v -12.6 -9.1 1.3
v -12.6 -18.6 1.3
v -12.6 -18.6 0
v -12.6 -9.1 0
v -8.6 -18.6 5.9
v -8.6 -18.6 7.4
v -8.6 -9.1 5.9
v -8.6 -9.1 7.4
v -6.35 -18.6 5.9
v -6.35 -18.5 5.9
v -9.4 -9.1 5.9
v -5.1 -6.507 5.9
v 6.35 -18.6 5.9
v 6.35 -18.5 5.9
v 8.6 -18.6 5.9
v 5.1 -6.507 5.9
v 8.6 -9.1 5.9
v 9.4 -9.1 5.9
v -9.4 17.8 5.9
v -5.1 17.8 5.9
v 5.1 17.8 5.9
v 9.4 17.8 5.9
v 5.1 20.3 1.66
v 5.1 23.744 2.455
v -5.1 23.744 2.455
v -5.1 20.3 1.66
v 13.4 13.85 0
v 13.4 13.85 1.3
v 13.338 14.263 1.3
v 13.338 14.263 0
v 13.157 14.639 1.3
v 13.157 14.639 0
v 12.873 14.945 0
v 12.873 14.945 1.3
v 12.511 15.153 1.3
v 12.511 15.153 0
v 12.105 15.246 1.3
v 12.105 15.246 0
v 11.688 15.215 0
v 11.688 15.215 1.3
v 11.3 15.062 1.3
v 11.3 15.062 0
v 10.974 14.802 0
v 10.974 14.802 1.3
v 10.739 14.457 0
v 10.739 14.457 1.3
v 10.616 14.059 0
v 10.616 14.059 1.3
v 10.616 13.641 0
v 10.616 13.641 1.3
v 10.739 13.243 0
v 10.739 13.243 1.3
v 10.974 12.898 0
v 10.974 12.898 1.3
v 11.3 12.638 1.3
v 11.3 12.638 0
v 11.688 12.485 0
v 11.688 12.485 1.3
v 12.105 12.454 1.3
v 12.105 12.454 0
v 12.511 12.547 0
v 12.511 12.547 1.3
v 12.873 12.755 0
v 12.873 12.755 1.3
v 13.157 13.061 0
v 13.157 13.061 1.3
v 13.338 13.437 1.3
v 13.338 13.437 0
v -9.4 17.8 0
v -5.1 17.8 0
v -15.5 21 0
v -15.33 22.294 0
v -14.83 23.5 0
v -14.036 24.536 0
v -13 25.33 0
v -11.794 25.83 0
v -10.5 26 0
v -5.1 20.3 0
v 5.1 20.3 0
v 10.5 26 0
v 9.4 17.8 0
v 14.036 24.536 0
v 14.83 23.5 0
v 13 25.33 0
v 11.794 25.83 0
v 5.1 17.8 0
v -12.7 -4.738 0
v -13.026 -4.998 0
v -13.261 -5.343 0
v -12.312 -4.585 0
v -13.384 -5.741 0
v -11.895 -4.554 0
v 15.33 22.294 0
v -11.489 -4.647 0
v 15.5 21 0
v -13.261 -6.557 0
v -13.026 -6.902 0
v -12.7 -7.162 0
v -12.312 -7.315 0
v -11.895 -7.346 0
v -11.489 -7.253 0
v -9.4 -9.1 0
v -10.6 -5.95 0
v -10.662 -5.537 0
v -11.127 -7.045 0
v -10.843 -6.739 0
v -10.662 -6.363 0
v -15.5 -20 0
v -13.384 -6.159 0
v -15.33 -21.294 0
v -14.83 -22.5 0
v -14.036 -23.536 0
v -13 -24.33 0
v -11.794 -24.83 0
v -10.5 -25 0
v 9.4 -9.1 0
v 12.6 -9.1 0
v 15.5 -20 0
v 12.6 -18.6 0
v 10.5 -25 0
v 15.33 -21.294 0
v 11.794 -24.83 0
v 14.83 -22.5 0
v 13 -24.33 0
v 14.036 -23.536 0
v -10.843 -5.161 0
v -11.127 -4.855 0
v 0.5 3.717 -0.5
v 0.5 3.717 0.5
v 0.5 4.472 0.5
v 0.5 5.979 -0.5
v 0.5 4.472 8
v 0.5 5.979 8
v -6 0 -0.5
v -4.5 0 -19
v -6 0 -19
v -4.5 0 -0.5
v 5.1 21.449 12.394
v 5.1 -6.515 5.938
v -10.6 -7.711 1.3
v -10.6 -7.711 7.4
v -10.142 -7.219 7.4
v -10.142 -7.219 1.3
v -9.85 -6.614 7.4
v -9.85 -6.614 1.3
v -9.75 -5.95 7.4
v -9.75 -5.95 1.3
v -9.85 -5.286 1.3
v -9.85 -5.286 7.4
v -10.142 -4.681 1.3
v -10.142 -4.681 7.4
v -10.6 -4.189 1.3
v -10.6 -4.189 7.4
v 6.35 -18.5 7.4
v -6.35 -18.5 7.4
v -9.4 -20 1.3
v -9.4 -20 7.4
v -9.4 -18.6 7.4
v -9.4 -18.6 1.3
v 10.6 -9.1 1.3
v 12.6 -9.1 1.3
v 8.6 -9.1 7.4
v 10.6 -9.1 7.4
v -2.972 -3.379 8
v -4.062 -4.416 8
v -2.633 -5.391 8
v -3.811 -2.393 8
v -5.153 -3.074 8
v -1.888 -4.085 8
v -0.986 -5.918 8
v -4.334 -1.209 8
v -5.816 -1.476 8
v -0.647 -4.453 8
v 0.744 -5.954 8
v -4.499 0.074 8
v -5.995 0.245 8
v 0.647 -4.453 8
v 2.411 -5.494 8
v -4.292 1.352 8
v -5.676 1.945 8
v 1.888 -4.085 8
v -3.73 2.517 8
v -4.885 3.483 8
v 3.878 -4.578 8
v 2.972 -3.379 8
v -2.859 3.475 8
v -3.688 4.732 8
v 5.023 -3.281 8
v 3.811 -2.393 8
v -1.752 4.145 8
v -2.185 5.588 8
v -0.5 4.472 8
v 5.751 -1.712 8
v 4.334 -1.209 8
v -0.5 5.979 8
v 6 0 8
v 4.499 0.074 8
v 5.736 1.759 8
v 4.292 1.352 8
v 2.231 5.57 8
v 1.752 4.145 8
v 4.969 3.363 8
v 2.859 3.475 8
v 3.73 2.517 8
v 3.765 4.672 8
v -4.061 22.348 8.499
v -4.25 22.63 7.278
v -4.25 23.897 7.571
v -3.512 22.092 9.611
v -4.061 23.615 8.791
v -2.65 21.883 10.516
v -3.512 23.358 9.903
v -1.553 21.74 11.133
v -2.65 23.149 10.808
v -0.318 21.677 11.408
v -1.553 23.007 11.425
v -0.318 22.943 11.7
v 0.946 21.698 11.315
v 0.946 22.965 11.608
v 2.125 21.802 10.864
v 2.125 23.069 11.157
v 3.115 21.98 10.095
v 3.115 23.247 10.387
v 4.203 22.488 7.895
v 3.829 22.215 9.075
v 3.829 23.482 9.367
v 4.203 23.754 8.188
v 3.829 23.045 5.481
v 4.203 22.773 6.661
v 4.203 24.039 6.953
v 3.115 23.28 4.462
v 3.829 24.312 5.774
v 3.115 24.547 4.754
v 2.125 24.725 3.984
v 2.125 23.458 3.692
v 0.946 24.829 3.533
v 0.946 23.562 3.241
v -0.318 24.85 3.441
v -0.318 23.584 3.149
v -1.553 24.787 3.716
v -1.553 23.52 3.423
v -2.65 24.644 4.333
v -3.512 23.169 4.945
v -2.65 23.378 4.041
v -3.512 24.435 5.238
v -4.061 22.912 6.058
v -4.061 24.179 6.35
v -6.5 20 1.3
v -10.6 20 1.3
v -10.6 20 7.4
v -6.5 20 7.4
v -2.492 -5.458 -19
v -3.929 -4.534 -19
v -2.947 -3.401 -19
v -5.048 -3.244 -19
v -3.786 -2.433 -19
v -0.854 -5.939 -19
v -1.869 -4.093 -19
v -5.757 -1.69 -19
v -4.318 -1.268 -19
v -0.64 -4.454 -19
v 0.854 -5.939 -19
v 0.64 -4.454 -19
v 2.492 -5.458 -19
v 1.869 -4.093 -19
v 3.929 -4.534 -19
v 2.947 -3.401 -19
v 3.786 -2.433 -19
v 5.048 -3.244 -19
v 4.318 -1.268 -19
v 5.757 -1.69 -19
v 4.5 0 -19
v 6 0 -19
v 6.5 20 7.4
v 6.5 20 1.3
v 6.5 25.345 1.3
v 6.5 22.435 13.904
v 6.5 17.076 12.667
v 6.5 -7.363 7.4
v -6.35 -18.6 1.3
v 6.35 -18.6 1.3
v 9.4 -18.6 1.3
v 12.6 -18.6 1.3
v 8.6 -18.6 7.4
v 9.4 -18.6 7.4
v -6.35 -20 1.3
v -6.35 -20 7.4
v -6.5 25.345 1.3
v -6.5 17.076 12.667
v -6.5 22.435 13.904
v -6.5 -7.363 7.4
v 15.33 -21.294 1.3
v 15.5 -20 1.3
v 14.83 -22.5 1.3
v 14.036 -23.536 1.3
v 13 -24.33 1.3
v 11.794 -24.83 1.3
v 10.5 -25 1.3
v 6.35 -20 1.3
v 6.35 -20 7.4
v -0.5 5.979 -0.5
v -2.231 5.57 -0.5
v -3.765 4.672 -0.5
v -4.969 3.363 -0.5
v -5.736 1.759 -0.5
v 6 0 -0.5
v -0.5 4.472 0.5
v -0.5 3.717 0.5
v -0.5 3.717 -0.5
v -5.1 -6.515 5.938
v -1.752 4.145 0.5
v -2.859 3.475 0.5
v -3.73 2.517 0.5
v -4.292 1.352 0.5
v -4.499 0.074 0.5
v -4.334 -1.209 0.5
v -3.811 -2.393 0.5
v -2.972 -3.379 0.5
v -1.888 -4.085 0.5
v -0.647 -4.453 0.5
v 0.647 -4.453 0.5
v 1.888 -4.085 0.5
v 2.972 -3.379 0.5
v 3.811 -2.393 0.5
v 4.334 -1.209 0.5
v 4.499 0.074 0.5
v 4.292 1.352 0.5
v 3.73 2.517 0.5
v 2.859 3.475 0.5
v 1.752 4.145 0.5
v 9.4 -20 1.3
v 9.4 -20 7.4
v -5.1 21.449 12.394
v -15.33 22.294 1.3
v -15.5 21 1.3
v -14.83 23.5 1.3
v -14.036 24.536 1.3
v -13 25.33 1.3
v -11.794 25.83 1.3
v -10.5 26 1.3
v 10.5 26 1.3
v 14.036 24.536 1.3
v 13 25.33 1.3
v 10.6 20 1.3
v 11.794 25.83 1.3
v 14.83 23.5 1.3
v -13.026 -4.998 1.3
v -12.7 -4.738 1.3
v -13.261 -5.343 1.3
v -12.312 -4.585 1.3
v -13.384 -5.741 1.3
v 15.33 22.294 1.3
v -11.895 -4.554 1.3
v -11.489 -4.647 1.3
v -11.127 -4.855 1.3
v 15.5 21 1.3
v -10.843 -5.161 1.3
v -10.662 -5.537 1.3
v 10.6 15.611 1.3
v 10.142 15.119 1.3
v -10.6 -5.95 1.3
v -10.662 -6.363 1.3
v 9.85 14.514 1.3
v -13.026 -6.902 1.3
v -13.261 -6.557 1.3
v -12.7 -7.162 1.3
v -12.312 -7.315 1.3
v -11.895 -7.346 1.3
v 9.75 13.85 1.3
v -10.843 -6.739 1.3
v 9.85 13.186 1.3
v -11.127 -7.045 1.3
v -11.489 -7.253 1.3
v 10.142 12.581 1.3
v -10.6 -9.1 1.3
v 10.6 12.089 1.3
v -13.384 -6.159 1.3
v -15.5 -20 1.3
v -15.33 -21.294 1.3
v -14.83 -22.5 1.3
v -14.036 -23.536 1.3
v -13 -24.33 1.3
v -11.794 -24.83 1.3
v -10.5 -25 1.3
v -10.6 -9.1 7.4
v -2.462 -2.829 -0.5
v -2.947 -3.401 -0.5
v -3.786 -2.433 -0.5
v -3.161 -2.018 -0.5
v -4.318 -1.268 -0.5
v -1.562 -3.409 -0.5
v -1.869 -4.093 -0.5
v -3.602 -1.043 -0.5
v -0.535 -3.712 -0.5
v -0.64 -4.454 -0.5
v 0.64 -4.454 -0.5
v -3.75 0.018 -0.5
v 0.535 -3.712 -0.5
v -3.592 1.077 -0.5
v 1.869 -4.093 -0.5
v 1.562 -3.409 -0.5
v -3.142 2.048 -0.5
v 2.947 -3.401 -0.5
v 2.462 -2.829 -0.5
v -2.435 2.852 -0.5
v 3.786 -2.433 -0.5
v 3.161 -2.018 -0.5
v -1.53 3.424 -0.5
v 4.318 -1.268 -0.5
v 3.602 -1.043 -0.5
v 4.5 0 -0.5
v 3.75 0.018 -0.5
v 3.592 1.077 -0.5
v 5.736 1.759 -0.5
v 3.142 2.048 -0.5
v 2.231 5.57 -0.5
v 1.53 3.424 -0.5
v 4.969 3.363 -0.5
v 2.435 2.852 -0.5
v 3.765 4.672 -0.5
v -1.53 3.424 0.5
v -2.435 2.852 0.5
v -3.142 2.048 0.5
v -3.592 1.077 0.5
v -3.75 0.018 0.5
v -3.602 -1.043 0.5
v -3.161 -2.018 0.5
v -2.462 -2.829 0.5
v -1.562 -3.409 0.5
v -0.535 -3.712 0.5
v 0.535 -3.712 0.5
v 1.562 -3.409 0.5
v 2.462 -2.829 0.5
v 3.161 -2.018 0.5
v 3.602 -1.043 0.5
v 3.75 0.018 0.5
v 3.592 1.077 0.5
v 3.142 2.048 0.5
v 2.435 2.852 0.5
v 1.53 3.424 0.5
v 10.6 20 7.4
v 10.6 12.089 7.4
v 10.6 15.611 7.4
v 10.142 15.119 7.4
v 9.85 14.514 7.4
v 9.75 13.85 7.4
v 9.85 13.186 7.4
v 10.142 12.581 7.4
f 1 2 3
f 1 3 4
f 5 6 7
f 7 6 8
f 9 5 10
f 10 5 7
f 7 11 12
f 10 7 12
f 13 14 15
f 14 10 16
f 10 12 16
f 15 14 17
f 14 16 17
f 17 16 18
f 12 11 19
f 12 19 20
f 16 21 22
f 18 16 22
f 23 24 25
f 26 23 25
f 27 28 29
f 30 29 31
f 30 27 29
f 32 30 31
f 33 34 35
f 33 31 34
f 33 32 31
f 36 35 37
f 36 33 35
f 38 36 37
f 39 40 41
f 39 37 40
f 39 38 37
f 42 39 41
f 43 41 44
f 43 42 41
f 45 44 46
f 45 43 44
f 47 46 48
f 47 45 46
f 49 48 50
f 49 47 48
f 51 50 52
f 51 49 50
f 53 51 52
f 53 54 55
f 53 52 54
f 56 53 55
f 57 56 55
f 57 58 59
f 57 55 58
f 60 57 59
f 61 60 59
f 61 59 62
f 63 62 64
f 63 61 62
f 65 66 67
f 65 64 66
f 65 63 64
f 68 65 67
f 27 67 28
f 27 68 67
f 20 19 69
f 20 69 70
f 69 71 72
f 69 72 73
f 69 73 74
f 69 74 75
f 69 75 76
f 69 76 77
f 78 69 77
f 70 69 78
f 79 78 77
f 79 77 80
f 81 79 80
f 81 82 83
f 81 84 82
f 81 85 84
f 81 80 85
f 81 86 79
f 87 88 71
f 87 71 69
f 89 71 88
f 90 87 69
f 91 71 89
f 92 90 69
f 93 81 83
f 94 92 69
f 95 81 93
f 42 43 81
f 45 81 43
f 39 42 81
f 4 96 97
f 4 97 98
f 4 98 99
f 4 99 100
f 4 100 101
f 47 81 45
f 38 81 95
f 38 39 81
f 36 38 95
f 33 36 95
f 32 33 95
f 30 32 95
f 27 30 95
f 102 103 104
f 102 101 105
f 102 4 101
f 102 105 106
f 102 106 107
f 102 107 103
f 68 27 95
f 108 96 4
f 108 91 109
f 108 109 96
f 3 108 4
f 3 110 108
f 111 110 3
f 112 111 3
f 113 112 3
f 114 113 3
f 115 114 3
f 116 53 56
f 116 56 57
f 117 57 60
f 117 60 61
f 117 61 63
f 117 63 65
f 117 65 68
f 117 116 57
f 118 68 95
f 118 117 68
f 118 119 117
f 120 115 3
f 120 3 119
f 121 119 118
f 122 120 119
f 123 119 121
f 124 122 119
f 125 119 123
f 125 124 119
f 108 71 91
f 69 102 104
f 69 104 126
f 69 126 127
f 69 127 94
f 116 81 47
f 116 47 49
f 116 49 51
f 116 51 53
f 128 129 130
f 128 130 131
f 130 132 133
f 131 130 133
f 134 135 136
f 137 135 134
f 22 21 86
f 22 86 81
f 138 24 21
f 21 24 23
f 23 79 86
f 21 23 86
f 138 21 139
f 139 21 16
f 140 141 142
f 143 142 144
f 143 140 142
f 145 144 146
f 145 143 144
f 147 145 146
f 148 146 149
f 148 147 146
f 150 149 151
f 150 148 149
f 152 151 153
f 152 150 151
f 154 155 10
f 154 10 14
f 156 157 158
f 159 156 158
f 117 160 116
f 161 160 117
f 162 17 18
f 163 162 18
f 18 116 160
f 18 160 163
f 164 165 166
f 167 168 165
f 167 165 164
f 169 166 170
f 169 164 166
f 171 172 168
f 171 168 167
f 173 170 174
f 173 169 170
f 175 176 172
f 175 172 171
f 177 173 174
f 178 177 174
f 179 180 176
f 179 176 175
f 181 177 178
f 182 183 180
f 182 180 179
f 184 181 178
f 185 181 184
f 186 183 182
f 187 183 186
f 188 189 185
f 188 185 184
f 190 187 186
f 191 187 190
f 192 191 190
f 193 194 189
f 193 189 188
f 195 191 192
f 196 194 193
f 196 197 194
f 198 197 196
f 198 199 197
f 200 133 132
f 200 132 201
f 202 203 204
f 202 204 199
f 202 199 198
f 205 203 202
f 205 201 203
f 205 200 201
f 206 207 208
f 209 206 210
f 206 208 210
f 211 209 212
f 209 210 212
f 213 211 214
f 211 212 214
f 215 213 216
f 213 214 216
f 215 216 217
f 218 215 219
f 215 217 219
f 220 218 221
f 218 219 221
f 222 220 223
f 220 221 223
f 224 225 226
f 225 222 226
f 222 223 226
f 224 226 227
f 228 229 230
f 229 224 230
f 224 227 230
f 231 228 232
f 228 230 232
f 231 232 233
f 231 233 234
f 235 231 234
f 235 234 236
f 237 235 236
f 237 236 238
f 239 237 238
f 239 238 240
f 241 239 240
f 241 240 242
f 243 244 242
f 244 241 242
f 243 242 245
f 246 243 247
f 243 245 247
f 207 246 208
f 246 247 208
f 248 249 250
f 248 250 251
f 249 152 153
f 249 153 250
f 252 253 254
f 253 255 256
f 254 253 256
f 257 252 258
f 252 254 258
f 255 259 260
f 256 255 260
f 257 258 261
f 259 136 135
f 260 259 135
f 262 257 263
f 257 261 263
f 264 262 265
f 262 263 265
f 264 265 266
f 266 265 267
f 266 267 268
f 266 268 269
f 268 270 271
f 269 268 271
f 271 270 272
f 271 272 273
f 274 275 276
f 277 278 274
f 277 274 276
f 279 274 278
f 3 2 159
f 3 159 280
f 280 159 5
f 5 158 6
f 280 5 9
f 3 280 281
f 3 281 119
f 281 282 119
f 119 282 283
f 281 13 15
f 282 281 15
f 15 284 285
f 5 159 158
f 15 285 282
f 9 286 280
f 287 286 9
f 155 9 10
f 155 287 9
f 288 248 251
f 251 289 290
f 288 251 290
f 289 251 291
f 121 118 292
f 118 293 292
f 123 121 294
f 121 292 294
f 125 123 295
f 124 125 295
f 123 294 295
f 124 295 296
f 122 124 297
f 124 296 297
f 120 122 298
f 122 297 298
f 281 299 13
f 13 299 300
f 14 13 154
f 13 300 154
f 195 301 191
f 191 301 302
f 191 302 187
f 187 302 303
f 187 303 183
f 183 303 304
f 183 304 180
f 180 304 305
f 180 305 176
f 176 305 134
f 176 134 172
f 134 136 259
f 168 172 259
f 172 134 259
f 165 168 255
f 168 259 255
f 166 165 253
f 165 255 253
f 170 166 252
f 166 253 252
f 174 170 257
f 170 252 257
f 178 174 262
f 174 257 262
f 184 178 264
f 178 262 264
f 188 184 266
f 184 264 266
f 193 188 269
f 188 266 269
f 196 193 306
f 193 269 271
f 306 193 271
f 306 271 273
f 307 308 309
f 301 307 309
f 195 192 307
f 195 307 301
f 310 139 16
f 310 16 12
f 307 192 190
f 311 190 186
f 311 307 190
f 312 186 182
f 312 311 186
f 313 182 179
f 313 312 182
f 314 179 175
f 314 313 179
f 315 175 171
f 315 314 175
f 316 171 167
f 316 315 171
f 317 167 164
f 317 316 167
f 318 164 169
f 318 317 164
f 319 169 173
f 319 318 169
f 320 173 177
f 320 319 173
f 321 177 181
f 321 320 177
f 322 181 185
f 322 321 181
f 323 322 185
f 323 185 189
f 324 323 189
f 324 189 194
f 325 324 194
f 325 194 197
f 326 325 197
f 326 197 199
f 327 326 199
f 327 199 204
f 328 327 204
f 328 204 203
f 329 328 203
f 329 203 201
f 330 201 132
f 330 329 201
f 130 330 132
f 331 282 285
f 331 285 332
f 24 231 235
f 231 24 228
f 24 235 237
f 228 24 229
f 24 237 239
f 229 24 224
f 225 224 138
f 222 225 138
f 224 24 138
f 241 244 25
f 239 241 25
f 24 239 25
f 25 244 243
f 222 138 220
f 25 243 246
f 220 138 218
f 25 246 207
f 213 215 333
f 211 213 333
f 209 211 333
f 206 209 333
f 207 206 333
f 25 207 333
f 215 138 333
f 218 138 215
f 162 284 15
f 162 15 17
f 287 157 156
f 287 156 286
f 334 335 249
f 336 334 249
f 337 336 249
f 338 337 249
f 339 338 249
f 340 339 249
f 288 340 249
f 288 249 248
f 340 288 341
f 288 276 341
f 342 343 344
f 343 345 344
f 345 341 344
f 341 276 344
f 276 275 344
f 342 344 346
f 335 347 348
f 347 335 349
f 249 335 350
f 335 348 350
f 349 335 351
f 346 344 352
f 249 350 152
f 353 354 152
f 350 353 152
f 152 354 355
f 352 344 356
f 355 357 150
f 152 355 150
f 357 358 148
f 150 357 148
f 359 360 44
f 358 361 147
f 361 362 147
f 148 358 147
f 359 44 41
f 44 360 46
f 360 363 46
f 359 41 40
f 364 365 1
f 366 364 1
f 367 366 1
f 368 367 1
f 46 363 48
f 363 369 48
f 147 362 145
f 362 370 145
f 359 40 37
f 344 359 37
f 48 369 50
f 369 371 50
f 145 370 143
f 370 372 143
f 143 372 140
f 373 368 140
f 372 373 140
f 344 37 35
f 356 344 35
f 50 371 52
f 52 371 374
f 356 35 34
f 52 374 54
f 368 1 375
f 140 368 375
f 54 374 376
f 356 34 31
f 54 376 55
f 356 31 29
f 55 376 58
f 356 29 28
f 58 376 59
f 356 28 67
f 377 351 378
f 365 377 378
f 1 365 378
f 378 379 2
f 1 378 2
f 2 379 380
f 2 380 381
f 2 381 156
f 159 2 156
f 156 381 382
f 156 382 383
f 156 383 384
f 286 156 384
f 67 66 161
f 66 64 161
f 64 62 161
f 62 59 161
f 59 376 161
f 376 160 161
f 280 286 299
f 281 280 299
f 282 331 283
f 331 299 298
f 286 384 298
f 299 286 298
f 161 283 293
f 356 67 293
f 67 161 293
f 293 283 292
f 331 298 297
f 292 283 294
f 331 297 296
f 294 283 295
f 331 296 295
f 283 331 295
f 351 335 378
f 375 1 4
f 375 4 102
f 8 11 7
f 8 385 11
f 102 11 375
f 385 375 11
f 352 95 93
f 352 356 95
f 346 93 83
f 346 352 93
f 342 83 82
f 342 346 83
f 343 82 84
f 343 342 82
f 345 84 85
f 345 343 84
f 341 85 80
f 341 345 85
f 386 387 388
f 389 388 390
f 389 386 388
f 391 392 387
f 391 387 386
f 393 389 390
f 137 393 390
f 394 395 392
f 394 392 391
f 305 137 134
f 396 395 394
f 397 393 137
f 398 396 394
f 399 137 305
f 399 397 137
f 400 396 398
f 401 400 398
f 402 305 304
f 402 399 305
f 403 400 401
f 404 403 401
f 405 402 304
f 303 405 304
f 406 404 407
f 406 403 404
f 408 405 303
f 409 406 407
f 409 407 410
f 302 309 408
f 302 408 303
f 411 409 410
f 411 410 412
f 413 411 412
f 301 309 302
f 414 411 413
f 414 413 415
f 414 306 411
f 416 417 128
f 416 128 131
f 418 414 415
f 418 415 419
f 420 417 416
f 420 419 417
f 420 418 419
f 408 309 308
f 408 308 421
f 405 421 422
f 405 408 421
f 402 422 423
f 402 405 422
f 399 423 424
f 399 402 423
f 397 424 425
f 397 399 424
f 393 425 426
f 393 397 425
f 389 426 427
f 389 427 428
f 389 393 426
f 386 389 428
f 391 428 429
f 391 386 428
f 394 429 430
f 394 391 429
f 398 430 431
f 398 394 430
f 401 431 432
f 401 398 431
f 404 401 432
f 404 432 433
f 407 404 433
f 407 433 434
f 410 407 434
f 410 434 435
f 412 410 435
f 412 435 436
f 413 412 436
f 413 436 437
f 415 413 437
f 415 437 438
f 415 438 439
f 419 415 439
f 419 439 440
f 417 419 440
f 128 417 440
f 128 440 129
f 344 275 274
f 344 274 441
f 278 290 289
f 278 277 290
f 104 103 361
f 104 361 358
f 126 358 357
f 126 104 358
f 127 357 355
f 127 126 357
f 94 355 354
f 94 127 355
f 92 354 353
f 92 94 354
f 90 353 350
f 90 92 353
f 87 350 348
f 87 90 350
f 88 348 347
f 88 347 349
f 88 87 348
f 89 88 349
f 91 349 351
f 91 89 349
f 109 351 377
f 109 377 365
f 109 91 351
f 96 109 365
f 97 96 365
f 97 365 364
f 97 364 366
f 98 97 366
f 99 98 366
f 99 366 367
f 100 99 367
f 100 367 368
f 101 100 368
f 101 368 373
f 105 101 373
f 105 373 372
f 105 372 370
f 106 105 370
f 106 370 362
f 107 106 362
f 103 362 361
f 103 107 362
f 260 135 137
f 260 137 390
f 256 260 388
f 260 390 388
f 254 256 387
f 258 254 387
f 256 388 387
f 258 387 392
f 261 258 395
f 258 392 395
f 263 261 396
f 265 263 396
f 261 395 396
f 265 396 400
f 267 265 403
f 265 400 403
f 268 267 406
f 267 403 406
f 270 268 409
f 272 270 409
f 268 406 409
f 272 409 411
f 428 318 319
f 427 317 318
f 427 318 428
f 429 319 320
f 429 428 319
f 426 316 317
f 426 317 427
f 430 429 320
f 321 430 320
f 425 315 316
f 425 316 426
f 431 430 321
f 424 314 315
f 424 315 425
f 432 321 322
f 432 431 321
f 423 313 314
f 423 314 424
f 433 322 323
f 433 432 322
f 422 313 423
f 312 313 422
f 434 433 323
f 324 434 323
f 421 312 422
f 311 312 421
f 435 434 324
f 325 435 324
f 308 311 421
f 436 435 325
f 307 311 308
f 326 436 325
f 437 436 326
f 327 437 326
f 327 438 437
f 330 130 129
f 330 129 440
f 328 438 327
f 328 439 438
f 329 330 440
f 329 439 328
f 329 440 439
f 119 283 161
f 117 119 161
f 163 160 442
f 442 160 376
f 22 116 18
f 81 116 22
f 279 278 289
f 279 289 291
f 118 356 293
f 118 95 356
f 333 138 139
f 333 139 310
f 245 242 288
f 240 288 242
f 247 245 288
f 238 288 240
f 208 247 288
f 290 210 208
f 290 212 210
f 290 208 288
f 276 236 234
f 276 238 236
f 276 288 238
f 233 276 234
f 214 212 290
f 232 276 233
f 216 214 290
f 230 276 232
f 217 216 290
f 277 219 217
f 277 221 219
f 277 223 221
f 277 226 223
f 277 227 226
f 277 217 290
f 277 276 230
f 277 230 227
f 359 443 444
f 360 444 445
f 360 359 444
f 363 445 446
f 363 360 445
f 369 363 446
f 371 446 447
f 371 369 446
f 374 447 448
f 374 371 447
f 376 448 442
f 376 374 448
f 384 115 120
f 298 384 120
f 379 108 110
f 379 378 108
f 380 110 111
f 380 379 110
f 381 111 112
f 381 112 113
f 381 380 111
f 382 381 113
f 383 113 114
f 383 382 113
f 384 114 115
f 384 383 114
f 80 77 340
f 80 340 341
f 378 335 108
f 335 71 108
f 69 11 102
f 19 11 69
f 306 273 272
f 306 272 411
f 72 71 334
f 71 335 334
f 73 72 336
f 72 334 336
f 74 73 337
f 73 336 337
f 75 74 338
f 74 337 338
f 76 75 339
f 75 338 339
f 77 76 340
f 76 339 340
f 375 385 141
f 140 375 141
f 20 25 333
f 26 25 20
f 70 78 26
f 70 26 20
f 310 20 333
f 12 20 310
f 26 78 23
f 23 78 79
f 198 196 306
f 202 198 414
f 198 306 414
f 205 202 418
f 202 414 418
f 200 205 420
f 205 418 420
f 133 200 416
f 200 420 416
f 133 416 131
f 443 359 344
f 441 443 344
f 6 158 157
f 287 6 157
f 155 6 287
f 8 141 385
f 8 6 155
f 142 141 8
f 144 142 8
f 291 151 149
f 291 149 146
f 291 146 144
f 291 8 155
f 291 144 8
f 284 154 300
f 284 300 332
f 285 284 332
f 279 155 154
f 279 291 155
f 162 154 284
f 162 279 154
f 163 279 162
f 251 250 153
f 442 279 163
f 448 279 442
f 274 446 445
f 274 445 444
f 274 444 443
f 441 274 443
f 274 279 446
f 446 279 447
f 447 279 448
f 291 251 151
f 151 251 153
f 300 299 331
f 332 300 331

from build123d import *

# Parameters (mm, degrees)
F0_W           = 31
F0_H           = 40
F0_R           = 1.4
F1_DEPTH       = 1.3
F4_R           = 4.15
F5_DEPTH       = 12.5
F7_DEPTH       = 5.9
F8_W           = 21.2
F8_H           = 40
F9_DEPTH       = 1.5
F10_DEPTH      = 25
F11_W          = 2
F11_H          = 9
F12_DEPTH      = 6.1
F13_W          = 18.8
F13_H          = 1.4
F14_DEPTH      = 5.9
F16_DEPTH      = 6.5
F18_DEPTH      = 6.5
F19_R          = 4.25
F20_DEPTH      = 25
F22_START      = -1.3
F21_W          = 10.2
F21_H          = 10.2
F22_DEPTH      = 28.7
F23_W          = 31
F23_H          = 6
F23_H_2        = 5
F24_DEPTH      = 1.3
F26_START      = -1.3
F25_W          = 8.5
F25_H          = 8.5
F26_DEPTH      = 33.7
F27_R          = 5
F28_W          = 12.7
F28_H          = 11.4416826424
F29_DEPTH      = 6.1
F30_W          = 10.2
F30_H          = 6.0366649356
F31_DEPTH      = 2
F32_R          = 2.25
F33_DEPTH      = 25
F34_W          = 18.8
F34_H          = 1.5
F35_DEPTH      = 25
F36_W          = 4
F36_H          = 9.5
F37_DEPTH      = 25
F38_W          = 0.8
F38_H          = 1.4
F39_DEPTH      = 6.1
F40_R          = 6
F40_R_2        = 4.5
F41_DEPTH      = 19
F41_DEPTH_BACK = 8
F42_R          = 6
F42_R_2        = 3.75
F43_DEPTH      = 0.5
F44_W          = 12.3386057094
F44_H          = 24.3167272657
F45_DEPTH      = 12.5
F46_W          = 1
F46_H          = 8.638324216
F47_DEPTH      = 25


with BuildPart() as f1:
    # F0 (on Top) → F1 (new body)
    with BuildSketch(Plane.XY):
        Rectangle(F0_W, F0_H)
        with Locations((-12, -5.95)):
            Circle(F0_R, mode=Mode.SUBTRACT)
        with Locations((12, 13.85)):
            Circle(F0_R, mode=Mode.SUBTRACT)
    extrude(amount=F1_DEPTH)

    # F4 (on face) → F5 (cut, symmetric)
    with BuildSketch(Plane.XY.offset(1.3)):
        with Locations((0, 4.35)):
            Circle(F4_R)
    extrude(amount=F5_DEPTH, both=True, mode=Mode.SUBTRACT)

    # F6 (on face) → F7 (join)
    with BuildSketch(Plane(origin=(0, 0, 0), x_dir=(1, 0, 0), z_dir=(0, 0, -1))):
        Polygon((9.4, 20), (9.4, -16.3), (-9.4, -16.3), (-9.4, 20), (-10.6, 20), (-10.6, -20), (0, -20), (10.6, -20), (10.6, 20), align=None)
    extrude(amount=-F7_DEPTH)

    # F8 (on face) → F9 (join)
    with BuildSketch(Plane.XY.offset(5.9)):
        Rectangle(F8_W, F8_H)
    extrude(amount=F9_DEPTH)

    # F10 (cut): a face of the model
    f10_faces = [f1.faces().sort_by_distance(p)[0] for p in [
        (0, -2.3838844232, 1.3),
    ]]
    extrude(f10_faces, amount=-F10_DEPTH, mode=Mode.SUBTRACT)

    # F11 (on face) → F12 (cut, through all)
    with BuildSketch(Plane.XY.offset(7.4)):
        with Locations((9.6, -16)):
            Rectangle(F11_W, F11_H)
        with Locations((-9.6, -16)):
            Rectangle(F11_W, F11_H)
    extrude(amount=-F12_DEPTH, mode=Mode.SUBTRACT)

    # F13 (on face) → F14 (join, through all)
    with BuildSketch(Plane(origin=(0, 0, 0), x_dir=(1, 0, 0), z_dir=(0, 0, -1))):
        with Locations((0, 19.3)):
            Rectangle(F13_W, F13_H)
    extrude(amount=-F14_DEPTH)

    # F15 (on Right) → F16 (join, symmetric)
    with BuildSketch(Plane.YZ):
        Polygon((17.0756362935, 12.6668108422), (20, 0), (25.3590353563, 1.2372307989), (22.4346716498, 13.9040416411), align=None)
    extrude(amount=F16_DEPTH, both=True)

    # F17 (on Right) → F18 (join, symmetric)
    with BuildSketch(Plane.YZ):
        Polygon((18.2915753857, 7.4), (17.0756362935, 12.6668108422), (-7.363281513, 7.4), align=None)
    extrude(amount=F18_DEPTH, both=True)

    # F19 (on face) → F20 (cut)
    with BuildSketch(Plane(origin=(0, 24.3469758193, 5.6209422668), x_dir=(-1, 0, 0), z_dir=(0, 0.9743700648, 0.2249510543))):
        with Locations((0, 2.0009789131)):
            Circle(F19_R)
    extrude(amount=-F20_DEPTH, mode=Mode.SUBTRACT)

    # F21 (on face) → F22 (cut)
    with BuildSketch(Plane(origin=(0, 24.3469758193, 5.6209422668), x_dir=(-1, 0, 0), z_dir=(0, 0.9743700648, 0.2249510543)).offset(F22_START)):
        with Locations((0, 2.1509789131)):
            Rectangle(F21_W, F21_H)
    extrude(amount=-F22_DEPTH, mode=Mode.SUBTRACT)

    # F23 (on face) → F24 (join)
    with BuildSketch(Plane(origin=(0, 0, 0), x_dir=(1, 0, 0), z_dir=(0, 0, -1))):
        with Locations((0, -23)):
            Rectangle(F23_W, F23_H)
        with Locations((0, 22.5)):
            Rectangle(F23_W, F23_H_2)
    extrude(amount=-F24_DEPTH)

    # F25 (on face) → F26 (cut)
    with BuildSketch(Plane(origin=(0, 24.3469758193, 5.6209422668), x_dir=(-1, 0, 0), z_dir=(0, 0.9743700648, 0.2249510543)).offset(F26_START)):
        with Locations((0, 2.0009789131)):
            Rectangle(F25_W, F25_H)
    extrude(amount=-F26_DEPTH, mode=Mode.SUBTRACT)

    # F27
    f27_edges = [f1.edges().sort_by_distance(p)[0] for p in [
        (-15.5, 26, 0.65),
        (15.5, 26, 0.65),
        (15.5, -25, 0.65),
        (-15.5, -25, 0.65),
    ]]
    fillet(f27_edges, radius=F27_R)

    # F28 (on face) → F29 (cut, through all)
    with BuildSketch(Plane.XY.offset(7.4)):
        with Locations((0, -24.2208413212)):
            Rectangle(F28_W, F28_H)
    extrude(amount=-F29_DEPTH, mode=Mode.SUBTRACT)

    # F30 (on face) → F31 (cut)
    with BuildSketch(Plane(origin=(0, 0, 0), x_dir=(1, 0, 0), z_dir=(0, 0, -1))):
        with Locations((0, -17.2816675322)):
            Rectangle(F30_W, F30_H)
    extrude(amount=-F31_DEPTH, mode=Mode.SUBTRACT)

    # F32 (on face) → F33 (cut)
    with BuildSketch(Plane.XY.offset(1.3)):
        with Locations((-12, -5.95)):
            Circle(F32_R)
        with Locations((12, 13.85)):
            Circle(F32_R)
    extrude(amount=F33_DEPTH, mode=Mode.SUBTRACT)

    # F34 (on face) → F35 (cut)
    with BuildSketch(Plane(origin=(0, 0, 5.9), x_dir=(1, 0, 0), z_dir=(0, 0, -1))):
        with Locations((0, -17.05)):
            Rectangle(F34_W, F34_H)
    extrude(amount=F35_DEPTH, mode=Mode.SUBTRACT)

    # F36 (on face) → F37 (cut)
    with BuildSketch(Plane.XY.offset(7.4)):
        with Locations((10.6, -13.85)):
            Rectangle(F36_W, F36_H)
        with Locations((-10.6, -13.85)):
            Rectangle(F36_W, F36_H)
    extrude(amount=-F37_DEPTH, mode=Mode.SUBTRACT)

    # F38 (on face) → F39 (join, through all)
    with BuildSketch(Plane.XY.offset(7.4)):
        with Locations((-9, -19.3)):
            Rectangle(F38_W, F38_H)
        with Locations((9, -19.3)):
            Rectangle(F38_W, F38_H)
    extrude(amount=-F39_DEPTH)


with BuildPart() as f41:
    # F40 (on Top) → F41 (new body, two sides)
    with BuildSketch(Plane.XY) as f41_sk:
        Circle(F40_R)
        Circle(F40_R_2, mode=Mode.SUBTRACT)
    extrude(amount=-F41_DEPTH)
    extrude(f41_sk.sketch, amount=F41_DEPTH_BACK)

    # F42 (on Top) → F43 (join, symmetric)
    with BuildSketch(Plane.XY):
        Circle(F42_R)
        Circle(F42_R_2, mode=Mode.SUBTRACT)
    extrude(amount=F43_DEPTH, both=True)

    # F44 (on Right) → F45 (cut, symmetric)
    with BuildSketch(Plane.YZ):
        with Locations((6.1693028547, -12.6583636329)):
            Rectangle(F44_W, F44_H)
    extrude(amount=F45_DEPTH, both=True, mode=Mode.SUBTRACT)

    # F46 (on face) → F47 (cut)
    with BuildSketch(Plane.XY.offset(8)):
        with Locations((0, 4.319162108)):
            Rectangle(F46_W, F46_H)
    extrude(amount=-F47_DEPTH, mode=Mode.SUBTRACT)


solid = Compound([f1.part, f41.part])
